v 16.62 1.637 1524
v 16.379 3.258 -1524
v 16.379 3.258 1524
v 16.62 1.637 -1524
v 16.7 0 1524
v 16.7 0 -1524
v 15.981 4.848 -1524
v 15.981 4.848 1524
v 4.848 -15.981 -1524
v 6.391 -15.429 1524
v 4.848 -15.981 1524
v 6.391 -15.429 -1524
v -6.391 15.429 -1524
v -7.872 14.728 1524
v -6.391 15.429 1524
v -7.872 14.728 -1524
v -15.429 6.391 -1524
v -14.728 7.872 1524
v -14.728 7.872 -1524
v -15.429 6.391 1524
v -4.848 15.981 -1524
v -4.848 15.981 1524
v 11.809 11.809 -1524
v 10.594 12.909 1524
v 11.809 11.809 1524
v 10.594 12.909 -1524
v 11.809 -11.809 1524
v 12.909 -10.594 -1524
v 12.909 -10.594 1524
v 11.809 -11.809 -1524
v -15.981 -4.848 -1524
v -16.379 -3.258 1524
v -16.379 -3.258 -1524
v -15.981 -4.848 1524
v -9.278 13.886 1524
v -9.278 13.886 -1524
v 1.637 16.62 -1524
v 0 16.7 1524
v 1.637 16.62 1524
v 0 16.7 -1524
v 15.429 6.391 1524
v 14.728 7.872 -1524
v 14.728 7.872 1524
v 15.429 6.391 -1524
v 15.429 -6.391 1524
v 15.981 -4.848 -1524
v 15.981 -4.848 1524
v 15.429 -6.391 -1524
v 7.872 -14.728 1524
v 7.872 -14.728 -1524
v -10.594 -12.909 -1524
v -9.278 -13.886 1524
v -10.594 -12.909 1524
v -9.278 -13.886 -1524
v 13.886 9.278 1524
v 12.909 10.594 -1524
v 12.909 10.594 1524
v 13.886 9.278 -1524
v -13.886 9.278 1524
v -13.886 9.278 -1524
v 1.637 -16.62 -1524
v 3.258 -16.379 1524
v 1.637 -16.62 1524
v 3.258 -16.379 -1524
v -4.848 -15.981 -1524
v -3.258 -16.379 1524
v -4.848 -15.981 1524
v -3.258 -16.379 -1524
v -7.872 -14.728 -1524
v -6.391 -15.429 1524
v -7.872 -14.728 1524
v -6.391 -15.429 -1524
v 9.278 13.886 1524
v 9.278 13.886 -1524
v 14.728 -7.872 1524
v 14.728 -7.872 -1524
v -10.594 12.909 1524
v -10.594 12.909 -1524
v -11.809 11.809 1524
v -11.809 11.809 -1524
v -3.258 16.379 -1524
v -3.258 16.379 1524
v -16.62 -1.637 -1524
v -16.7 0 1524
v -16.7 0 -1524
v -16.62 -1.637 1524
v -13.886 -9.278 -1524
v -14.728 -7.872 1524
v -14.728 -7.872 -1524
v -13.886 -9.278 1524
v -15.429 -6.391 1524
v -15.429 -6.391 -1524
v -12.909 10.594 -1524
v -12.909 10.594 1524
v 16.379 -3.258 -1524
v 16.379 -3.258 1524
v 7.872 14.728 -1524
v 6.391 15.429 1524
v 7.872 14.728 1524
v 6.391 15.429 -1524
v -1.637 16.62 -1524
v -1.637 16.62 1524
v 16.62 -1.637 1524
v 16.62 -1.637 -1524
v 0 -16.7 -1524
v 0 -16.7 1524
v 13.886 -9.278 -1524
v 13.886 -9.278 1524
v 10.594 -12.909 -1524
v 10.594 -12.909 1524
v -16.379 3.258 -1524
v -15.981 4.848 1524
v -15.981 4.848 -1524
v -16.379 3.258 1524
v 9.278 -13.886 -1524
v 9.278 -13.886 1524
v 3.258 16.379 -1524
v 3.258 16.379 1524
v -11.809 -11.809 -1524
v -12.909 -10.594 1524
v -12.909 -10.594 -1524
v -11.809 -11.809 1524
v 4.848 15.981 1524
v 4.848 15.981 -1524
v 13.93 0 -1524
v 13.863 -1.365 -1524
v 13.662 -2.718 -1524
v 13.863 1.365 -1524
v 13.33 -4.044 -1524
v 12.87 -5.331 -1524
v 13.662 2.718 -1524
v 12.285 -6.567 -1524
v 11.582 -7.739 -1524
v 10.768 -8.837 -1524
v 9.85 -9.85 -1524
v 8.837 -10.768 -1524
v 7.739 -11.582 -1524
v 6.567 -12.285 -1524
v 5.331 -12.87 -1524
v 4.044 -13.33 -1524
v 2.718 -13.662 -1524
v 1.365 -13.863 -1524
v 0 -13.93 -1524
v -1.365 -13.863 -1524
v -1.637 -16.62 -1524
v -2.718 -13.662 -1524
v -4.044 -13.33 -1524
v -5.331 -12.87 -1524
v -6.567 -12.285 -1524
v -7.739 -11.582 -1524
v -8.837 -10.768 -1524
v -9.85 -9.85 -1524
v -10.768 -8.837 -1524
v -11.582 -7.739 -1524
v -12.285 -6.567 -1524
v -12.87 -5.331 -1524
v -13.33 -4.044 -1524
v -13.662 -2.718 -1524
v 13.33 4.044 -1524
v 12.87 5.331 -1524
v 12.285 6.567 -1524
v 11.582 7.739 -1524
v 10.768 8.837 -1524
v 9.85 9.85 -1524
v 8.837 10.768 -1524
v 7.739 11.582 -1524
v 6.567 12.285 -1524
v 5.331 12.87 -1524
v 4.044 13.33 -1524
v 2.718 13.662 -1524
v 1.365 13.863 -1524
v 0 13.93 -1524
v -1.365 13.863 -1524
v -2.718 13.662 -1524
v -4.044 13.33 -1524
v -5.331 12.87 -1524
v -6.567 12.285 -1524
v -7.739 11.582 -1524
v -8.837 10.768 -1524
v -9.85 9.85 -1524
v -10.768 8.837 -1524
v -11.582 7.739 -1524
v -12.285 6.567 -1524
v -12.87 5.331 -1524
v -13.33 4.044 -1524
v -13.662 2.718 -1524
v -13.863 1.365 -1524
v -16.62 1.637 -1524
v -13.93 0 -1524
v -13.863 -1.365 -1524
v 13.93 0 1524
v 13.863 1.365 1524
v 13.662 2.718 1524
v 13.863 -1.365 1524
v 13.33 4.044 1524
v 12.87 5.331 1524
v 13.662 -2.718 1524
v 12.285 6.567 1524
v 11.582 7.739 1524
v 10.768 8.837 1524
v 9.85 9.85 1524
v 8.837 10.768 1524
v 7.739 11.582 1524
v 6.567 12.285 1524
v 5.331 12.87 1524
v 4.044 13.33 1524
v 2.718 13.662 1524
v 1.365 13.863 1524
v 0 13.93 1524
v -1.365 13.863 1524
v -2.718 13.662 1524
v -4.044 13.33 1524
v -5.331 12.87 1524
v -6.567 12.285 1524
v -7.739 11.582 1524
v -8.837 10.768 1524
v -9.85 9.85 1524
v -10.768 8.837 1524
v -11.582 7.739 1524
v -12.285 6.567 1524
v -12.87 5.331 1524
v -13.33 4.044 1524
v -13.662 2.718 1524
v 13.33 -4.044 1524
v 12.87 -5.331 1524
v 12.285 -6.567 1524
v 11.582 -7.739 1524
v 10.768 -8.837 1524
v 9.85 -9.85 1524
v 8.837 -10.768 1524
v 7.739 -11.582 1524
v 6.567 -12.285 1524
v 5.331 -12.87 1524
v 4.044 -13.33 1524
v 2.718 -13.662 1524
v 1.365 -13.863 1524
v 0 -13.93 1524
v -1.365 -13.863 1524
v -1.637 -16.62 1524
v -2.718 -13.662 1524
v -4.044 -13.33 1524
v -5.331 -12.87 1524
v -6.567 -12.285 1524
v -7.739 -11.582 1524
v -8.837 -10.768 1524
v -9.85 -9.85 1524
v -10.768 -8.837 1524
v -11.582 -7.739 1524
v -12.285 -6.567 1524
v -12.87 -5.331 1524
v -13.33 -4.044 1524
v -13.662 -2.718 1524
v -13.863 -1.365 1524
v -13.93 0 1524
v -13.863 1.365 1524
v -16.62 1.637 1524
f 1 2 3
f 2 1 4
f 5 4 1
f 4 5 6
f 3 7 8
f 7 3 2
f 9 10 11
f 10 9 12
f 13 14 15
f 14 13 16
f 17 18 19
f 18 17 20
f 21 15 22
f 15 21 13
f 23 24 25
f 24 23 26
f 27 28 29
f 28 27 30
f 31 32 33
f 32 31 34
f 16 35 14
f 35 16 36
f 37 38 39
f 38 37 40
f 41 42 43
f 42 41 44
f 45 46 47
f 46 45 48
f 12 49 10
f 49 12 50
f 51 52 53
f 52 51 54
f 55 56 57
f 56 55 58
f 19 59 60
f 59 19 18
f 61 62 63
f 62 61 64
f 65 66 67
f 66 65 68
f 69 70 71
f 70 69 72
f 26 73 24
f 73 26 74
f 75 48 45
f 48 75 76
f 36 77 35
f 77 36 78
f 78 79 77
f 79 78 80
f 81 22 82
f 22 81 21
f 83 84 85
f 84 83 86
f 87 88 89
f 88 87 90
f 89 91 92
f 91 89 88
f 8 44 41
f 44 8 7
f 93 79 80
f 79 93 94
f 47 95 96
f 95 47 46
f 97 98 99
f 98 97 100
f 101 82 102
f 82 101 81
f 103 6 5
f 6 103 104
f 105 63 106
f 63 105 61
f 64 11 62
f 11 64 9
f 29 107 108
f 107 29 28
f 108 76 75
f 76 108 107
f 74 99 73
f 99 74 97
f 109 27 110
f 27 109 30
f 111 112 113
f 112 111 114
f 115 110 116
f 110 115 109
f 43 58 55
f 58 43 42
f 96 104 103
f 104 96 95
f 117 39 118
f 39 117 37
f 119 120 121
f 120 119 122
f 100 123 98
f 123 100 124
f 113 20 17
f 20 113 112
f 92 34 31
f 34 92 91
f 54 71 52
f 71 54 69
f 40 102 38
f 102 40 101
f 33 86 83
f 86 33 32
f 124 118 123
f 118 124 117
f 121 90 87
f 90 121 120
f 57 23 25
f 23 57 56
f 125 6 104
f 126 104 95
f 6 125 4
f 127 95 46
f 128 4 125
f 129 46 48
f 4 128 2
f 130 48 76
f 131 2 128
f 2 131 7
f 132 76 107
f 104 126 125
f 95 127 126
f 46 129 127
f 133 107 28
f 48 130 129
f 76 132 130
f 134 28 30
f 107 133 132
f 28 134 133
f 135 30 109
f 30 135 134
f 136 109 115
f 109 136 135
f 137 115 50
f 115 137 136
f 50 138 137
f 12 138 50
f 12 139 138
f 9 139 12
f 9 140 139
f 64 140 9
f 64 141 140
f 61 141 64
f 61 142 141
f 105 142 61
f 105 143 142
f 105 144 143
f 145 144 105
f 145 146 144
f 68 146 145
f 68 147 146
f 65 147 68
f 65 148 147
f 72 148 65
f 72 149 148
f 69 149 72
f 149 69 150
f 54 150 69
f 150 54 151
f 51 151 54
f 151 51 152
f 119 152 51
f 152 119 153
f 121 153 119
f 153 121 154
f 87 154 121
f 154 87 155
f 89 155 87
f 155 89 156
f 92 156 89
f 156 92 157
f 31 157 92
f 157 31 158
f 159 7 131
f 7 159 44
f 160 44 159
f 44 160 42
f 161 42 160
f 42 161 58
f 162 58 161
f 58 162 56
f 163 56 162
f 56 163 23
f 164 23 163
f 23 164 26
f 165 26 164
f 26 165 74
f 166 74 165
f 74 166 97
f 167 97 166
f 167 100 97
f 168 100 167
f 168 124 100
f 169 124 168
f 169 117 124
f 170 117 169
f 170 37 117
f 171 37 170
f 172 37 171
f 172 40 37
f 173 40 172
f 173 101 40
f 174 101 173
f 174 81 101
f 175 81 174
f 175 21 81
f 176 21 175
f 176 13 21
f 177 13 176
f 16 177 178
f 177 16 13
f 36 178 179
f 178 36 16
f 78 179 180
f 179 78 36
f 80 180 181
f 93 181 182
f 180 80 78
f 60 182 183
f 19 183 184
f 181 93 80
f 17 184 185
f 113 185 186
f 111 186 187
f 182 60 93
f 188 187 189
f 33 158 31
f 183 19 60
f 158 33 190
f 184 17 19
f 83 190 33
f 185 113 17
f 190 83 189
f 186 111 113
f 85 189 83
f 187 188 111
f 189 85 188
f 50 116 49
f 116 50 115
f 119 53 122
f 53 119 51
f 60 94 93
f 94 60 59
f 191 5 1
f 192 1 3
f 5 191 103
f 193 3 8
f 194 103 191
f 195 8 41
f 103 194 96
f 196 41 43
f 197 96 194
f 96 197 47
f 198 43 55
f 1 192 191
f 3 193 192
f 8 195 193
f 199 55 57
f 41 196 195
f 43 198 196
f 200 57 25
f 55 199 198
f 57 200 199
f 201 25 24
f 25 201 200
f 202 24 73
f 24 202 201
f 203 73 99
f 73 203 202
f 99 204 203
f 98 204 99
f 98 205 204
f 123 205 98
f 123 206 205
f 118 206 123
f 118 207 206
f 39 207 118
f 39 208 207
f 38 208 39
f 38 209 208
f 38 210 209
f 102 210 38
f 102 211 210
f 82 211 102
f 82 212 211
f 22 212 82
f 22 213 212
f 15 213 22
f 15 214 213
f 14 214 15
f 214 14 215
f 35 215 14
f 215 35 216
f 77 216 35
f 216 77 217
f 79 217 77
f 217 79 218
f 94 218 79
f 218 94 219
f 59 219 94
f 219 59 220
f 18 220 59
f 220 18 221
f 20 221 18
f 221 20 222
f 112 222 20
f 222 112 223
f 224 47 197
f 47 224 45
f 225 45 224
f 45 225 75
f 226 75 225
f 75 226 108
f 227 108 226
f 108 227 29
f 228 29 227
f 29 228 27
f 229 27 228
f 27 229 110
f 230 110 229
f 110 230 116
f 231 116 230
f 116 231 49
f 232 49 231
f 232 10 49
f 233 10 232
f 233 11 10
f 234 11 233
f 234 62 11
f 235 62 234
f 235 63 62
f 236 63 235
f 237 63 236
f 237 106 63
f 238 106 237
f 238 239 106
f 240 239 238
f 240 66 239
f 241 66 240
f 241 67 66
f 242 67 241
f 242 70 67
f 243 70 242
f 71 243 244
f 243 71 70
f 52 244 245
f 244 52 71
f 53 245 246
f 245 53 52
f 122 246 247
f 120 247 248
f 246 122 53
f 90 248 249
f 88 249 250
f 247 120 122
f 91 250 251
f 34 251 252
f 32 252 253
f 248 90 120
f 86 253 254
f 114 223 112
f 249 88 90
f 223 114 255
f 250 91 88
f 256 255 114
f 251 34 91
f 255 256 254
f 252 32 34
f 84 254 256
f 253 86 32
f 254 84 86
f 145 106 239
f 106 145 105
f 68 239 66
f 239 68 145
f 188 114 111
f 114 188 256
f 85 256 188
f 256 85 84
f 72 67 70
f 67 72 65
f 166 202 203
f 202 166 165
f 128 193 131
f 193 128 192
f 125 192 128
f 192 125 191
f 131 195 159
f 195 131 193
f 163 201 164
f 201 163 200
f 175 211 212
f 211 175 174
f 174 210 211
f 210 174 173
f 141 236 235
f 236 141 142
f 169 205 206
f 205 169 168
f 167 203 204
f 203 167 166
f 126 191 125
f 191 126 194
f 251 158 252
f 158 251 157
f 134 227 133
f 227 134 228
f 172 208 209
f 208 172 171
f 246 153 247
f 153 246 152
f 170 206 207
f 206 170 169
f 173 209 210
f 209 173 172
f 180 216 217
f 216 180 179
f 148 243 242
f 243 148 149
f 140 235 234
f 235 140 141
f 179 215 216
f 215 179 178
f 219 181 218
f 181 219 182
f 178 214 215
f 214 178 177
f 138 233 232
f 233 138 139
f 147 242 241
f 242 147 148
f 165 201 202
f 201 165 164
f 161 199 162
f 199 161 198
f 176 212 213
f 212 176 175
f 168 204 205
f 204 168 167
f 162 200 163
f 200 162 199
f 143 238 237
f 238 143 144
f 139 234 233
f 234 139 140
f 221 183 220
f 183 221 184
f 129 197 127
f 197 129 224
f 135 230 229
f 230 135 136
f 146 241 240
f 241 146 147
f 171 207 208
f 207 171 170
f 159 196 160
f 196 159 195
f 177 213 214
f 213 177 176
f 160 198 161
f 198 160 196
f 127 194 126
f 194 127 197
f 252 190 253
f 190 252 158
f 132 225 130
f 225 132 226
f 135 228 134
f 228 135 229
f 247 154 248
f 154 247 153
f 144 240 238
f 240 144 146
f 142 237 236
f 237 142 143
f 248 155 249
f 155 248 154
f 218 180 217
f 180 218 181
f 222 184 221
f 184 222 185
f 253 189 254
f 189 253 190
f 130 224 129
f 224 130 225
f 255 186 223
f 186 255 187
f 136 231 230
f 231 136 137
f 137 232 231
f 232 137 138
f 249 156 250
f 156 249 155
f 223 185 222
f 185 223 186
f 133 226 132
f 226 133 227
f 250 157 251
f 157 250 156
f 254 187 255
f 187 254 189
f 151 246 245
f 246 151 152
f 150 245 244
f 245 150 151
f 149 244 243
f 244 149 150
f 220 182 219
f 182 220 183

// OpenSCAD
// Auto-generated by scripts/author_from_manifest.py (Phase D.3).
// Source: data/phase_d_manifest.json (sku_intent='blazemaster-cpvc-1in-10ft').
// Do not hand-edit — regenerate from the manifest.
//
// @part blazemaster_cpvc_1in_10ft
// @kind pipe_segment
// @category pipe.cpvc.blazemaster
// @display-name "Cpvc Blazemaster 1\" x 10ft"
// @mfg lubrizol_blazemaster
// @listing UL
// @price-usd 6.50
// @install-minutes 3
// @crew journeyman
// @param size_in number default=1 label="Size" unit="in"
// @port inlet position=[0,0,-0.5] direction=[0,0,-1] style=grooved size_in=1 role=run_a
// @port outlet position=[0,0,0.5] direction=[0,0,1] style=grooved size_in=1 role=run_b

size_in  = 1.0;
length_m = 3.0480;
schedule = "sch10";

function od_mm(nps) =
    nps ==  0.75 ? 26.7 :
    nps ==   1  ? 33.4 :
    nps == 1.25 ? 42.2 :
    nps == 1.5  ? 48.3 :
    nps ==   2  ? 60.3 :
    nps == 2.5  ? 73.0 :
    nps ==   3  ? 88.9 :
    nps ==   4  ? 114.3 :
    nps ==   5  ? 141.3 :
    nps ==   6  ? 168.3 :
    nps ==   8  ? 219.1 :
    nps ==  10  ? 273.0 : 60.3;

function wall_mm(nps, sched) =
    sched == "sch40"
        ? (nps <= 1.5 ? 3.68 : nps <= 3 ? 5.49 : 6.02)
        : (nps <= 1.5 ? 2.77 : nps <= 3 ? 3.05 : 3.68);

od = od_mm(size_in);
id = od - 2 * wall_mm(size_in, schedule);
len_mm = length_m * 1000;

difference() {
    cylinder(h = len_mm, d = od, center = true, $fn = 64);
    cylinder(h = len_mm + 1, d = id, center = true, $fn = 64);
}
